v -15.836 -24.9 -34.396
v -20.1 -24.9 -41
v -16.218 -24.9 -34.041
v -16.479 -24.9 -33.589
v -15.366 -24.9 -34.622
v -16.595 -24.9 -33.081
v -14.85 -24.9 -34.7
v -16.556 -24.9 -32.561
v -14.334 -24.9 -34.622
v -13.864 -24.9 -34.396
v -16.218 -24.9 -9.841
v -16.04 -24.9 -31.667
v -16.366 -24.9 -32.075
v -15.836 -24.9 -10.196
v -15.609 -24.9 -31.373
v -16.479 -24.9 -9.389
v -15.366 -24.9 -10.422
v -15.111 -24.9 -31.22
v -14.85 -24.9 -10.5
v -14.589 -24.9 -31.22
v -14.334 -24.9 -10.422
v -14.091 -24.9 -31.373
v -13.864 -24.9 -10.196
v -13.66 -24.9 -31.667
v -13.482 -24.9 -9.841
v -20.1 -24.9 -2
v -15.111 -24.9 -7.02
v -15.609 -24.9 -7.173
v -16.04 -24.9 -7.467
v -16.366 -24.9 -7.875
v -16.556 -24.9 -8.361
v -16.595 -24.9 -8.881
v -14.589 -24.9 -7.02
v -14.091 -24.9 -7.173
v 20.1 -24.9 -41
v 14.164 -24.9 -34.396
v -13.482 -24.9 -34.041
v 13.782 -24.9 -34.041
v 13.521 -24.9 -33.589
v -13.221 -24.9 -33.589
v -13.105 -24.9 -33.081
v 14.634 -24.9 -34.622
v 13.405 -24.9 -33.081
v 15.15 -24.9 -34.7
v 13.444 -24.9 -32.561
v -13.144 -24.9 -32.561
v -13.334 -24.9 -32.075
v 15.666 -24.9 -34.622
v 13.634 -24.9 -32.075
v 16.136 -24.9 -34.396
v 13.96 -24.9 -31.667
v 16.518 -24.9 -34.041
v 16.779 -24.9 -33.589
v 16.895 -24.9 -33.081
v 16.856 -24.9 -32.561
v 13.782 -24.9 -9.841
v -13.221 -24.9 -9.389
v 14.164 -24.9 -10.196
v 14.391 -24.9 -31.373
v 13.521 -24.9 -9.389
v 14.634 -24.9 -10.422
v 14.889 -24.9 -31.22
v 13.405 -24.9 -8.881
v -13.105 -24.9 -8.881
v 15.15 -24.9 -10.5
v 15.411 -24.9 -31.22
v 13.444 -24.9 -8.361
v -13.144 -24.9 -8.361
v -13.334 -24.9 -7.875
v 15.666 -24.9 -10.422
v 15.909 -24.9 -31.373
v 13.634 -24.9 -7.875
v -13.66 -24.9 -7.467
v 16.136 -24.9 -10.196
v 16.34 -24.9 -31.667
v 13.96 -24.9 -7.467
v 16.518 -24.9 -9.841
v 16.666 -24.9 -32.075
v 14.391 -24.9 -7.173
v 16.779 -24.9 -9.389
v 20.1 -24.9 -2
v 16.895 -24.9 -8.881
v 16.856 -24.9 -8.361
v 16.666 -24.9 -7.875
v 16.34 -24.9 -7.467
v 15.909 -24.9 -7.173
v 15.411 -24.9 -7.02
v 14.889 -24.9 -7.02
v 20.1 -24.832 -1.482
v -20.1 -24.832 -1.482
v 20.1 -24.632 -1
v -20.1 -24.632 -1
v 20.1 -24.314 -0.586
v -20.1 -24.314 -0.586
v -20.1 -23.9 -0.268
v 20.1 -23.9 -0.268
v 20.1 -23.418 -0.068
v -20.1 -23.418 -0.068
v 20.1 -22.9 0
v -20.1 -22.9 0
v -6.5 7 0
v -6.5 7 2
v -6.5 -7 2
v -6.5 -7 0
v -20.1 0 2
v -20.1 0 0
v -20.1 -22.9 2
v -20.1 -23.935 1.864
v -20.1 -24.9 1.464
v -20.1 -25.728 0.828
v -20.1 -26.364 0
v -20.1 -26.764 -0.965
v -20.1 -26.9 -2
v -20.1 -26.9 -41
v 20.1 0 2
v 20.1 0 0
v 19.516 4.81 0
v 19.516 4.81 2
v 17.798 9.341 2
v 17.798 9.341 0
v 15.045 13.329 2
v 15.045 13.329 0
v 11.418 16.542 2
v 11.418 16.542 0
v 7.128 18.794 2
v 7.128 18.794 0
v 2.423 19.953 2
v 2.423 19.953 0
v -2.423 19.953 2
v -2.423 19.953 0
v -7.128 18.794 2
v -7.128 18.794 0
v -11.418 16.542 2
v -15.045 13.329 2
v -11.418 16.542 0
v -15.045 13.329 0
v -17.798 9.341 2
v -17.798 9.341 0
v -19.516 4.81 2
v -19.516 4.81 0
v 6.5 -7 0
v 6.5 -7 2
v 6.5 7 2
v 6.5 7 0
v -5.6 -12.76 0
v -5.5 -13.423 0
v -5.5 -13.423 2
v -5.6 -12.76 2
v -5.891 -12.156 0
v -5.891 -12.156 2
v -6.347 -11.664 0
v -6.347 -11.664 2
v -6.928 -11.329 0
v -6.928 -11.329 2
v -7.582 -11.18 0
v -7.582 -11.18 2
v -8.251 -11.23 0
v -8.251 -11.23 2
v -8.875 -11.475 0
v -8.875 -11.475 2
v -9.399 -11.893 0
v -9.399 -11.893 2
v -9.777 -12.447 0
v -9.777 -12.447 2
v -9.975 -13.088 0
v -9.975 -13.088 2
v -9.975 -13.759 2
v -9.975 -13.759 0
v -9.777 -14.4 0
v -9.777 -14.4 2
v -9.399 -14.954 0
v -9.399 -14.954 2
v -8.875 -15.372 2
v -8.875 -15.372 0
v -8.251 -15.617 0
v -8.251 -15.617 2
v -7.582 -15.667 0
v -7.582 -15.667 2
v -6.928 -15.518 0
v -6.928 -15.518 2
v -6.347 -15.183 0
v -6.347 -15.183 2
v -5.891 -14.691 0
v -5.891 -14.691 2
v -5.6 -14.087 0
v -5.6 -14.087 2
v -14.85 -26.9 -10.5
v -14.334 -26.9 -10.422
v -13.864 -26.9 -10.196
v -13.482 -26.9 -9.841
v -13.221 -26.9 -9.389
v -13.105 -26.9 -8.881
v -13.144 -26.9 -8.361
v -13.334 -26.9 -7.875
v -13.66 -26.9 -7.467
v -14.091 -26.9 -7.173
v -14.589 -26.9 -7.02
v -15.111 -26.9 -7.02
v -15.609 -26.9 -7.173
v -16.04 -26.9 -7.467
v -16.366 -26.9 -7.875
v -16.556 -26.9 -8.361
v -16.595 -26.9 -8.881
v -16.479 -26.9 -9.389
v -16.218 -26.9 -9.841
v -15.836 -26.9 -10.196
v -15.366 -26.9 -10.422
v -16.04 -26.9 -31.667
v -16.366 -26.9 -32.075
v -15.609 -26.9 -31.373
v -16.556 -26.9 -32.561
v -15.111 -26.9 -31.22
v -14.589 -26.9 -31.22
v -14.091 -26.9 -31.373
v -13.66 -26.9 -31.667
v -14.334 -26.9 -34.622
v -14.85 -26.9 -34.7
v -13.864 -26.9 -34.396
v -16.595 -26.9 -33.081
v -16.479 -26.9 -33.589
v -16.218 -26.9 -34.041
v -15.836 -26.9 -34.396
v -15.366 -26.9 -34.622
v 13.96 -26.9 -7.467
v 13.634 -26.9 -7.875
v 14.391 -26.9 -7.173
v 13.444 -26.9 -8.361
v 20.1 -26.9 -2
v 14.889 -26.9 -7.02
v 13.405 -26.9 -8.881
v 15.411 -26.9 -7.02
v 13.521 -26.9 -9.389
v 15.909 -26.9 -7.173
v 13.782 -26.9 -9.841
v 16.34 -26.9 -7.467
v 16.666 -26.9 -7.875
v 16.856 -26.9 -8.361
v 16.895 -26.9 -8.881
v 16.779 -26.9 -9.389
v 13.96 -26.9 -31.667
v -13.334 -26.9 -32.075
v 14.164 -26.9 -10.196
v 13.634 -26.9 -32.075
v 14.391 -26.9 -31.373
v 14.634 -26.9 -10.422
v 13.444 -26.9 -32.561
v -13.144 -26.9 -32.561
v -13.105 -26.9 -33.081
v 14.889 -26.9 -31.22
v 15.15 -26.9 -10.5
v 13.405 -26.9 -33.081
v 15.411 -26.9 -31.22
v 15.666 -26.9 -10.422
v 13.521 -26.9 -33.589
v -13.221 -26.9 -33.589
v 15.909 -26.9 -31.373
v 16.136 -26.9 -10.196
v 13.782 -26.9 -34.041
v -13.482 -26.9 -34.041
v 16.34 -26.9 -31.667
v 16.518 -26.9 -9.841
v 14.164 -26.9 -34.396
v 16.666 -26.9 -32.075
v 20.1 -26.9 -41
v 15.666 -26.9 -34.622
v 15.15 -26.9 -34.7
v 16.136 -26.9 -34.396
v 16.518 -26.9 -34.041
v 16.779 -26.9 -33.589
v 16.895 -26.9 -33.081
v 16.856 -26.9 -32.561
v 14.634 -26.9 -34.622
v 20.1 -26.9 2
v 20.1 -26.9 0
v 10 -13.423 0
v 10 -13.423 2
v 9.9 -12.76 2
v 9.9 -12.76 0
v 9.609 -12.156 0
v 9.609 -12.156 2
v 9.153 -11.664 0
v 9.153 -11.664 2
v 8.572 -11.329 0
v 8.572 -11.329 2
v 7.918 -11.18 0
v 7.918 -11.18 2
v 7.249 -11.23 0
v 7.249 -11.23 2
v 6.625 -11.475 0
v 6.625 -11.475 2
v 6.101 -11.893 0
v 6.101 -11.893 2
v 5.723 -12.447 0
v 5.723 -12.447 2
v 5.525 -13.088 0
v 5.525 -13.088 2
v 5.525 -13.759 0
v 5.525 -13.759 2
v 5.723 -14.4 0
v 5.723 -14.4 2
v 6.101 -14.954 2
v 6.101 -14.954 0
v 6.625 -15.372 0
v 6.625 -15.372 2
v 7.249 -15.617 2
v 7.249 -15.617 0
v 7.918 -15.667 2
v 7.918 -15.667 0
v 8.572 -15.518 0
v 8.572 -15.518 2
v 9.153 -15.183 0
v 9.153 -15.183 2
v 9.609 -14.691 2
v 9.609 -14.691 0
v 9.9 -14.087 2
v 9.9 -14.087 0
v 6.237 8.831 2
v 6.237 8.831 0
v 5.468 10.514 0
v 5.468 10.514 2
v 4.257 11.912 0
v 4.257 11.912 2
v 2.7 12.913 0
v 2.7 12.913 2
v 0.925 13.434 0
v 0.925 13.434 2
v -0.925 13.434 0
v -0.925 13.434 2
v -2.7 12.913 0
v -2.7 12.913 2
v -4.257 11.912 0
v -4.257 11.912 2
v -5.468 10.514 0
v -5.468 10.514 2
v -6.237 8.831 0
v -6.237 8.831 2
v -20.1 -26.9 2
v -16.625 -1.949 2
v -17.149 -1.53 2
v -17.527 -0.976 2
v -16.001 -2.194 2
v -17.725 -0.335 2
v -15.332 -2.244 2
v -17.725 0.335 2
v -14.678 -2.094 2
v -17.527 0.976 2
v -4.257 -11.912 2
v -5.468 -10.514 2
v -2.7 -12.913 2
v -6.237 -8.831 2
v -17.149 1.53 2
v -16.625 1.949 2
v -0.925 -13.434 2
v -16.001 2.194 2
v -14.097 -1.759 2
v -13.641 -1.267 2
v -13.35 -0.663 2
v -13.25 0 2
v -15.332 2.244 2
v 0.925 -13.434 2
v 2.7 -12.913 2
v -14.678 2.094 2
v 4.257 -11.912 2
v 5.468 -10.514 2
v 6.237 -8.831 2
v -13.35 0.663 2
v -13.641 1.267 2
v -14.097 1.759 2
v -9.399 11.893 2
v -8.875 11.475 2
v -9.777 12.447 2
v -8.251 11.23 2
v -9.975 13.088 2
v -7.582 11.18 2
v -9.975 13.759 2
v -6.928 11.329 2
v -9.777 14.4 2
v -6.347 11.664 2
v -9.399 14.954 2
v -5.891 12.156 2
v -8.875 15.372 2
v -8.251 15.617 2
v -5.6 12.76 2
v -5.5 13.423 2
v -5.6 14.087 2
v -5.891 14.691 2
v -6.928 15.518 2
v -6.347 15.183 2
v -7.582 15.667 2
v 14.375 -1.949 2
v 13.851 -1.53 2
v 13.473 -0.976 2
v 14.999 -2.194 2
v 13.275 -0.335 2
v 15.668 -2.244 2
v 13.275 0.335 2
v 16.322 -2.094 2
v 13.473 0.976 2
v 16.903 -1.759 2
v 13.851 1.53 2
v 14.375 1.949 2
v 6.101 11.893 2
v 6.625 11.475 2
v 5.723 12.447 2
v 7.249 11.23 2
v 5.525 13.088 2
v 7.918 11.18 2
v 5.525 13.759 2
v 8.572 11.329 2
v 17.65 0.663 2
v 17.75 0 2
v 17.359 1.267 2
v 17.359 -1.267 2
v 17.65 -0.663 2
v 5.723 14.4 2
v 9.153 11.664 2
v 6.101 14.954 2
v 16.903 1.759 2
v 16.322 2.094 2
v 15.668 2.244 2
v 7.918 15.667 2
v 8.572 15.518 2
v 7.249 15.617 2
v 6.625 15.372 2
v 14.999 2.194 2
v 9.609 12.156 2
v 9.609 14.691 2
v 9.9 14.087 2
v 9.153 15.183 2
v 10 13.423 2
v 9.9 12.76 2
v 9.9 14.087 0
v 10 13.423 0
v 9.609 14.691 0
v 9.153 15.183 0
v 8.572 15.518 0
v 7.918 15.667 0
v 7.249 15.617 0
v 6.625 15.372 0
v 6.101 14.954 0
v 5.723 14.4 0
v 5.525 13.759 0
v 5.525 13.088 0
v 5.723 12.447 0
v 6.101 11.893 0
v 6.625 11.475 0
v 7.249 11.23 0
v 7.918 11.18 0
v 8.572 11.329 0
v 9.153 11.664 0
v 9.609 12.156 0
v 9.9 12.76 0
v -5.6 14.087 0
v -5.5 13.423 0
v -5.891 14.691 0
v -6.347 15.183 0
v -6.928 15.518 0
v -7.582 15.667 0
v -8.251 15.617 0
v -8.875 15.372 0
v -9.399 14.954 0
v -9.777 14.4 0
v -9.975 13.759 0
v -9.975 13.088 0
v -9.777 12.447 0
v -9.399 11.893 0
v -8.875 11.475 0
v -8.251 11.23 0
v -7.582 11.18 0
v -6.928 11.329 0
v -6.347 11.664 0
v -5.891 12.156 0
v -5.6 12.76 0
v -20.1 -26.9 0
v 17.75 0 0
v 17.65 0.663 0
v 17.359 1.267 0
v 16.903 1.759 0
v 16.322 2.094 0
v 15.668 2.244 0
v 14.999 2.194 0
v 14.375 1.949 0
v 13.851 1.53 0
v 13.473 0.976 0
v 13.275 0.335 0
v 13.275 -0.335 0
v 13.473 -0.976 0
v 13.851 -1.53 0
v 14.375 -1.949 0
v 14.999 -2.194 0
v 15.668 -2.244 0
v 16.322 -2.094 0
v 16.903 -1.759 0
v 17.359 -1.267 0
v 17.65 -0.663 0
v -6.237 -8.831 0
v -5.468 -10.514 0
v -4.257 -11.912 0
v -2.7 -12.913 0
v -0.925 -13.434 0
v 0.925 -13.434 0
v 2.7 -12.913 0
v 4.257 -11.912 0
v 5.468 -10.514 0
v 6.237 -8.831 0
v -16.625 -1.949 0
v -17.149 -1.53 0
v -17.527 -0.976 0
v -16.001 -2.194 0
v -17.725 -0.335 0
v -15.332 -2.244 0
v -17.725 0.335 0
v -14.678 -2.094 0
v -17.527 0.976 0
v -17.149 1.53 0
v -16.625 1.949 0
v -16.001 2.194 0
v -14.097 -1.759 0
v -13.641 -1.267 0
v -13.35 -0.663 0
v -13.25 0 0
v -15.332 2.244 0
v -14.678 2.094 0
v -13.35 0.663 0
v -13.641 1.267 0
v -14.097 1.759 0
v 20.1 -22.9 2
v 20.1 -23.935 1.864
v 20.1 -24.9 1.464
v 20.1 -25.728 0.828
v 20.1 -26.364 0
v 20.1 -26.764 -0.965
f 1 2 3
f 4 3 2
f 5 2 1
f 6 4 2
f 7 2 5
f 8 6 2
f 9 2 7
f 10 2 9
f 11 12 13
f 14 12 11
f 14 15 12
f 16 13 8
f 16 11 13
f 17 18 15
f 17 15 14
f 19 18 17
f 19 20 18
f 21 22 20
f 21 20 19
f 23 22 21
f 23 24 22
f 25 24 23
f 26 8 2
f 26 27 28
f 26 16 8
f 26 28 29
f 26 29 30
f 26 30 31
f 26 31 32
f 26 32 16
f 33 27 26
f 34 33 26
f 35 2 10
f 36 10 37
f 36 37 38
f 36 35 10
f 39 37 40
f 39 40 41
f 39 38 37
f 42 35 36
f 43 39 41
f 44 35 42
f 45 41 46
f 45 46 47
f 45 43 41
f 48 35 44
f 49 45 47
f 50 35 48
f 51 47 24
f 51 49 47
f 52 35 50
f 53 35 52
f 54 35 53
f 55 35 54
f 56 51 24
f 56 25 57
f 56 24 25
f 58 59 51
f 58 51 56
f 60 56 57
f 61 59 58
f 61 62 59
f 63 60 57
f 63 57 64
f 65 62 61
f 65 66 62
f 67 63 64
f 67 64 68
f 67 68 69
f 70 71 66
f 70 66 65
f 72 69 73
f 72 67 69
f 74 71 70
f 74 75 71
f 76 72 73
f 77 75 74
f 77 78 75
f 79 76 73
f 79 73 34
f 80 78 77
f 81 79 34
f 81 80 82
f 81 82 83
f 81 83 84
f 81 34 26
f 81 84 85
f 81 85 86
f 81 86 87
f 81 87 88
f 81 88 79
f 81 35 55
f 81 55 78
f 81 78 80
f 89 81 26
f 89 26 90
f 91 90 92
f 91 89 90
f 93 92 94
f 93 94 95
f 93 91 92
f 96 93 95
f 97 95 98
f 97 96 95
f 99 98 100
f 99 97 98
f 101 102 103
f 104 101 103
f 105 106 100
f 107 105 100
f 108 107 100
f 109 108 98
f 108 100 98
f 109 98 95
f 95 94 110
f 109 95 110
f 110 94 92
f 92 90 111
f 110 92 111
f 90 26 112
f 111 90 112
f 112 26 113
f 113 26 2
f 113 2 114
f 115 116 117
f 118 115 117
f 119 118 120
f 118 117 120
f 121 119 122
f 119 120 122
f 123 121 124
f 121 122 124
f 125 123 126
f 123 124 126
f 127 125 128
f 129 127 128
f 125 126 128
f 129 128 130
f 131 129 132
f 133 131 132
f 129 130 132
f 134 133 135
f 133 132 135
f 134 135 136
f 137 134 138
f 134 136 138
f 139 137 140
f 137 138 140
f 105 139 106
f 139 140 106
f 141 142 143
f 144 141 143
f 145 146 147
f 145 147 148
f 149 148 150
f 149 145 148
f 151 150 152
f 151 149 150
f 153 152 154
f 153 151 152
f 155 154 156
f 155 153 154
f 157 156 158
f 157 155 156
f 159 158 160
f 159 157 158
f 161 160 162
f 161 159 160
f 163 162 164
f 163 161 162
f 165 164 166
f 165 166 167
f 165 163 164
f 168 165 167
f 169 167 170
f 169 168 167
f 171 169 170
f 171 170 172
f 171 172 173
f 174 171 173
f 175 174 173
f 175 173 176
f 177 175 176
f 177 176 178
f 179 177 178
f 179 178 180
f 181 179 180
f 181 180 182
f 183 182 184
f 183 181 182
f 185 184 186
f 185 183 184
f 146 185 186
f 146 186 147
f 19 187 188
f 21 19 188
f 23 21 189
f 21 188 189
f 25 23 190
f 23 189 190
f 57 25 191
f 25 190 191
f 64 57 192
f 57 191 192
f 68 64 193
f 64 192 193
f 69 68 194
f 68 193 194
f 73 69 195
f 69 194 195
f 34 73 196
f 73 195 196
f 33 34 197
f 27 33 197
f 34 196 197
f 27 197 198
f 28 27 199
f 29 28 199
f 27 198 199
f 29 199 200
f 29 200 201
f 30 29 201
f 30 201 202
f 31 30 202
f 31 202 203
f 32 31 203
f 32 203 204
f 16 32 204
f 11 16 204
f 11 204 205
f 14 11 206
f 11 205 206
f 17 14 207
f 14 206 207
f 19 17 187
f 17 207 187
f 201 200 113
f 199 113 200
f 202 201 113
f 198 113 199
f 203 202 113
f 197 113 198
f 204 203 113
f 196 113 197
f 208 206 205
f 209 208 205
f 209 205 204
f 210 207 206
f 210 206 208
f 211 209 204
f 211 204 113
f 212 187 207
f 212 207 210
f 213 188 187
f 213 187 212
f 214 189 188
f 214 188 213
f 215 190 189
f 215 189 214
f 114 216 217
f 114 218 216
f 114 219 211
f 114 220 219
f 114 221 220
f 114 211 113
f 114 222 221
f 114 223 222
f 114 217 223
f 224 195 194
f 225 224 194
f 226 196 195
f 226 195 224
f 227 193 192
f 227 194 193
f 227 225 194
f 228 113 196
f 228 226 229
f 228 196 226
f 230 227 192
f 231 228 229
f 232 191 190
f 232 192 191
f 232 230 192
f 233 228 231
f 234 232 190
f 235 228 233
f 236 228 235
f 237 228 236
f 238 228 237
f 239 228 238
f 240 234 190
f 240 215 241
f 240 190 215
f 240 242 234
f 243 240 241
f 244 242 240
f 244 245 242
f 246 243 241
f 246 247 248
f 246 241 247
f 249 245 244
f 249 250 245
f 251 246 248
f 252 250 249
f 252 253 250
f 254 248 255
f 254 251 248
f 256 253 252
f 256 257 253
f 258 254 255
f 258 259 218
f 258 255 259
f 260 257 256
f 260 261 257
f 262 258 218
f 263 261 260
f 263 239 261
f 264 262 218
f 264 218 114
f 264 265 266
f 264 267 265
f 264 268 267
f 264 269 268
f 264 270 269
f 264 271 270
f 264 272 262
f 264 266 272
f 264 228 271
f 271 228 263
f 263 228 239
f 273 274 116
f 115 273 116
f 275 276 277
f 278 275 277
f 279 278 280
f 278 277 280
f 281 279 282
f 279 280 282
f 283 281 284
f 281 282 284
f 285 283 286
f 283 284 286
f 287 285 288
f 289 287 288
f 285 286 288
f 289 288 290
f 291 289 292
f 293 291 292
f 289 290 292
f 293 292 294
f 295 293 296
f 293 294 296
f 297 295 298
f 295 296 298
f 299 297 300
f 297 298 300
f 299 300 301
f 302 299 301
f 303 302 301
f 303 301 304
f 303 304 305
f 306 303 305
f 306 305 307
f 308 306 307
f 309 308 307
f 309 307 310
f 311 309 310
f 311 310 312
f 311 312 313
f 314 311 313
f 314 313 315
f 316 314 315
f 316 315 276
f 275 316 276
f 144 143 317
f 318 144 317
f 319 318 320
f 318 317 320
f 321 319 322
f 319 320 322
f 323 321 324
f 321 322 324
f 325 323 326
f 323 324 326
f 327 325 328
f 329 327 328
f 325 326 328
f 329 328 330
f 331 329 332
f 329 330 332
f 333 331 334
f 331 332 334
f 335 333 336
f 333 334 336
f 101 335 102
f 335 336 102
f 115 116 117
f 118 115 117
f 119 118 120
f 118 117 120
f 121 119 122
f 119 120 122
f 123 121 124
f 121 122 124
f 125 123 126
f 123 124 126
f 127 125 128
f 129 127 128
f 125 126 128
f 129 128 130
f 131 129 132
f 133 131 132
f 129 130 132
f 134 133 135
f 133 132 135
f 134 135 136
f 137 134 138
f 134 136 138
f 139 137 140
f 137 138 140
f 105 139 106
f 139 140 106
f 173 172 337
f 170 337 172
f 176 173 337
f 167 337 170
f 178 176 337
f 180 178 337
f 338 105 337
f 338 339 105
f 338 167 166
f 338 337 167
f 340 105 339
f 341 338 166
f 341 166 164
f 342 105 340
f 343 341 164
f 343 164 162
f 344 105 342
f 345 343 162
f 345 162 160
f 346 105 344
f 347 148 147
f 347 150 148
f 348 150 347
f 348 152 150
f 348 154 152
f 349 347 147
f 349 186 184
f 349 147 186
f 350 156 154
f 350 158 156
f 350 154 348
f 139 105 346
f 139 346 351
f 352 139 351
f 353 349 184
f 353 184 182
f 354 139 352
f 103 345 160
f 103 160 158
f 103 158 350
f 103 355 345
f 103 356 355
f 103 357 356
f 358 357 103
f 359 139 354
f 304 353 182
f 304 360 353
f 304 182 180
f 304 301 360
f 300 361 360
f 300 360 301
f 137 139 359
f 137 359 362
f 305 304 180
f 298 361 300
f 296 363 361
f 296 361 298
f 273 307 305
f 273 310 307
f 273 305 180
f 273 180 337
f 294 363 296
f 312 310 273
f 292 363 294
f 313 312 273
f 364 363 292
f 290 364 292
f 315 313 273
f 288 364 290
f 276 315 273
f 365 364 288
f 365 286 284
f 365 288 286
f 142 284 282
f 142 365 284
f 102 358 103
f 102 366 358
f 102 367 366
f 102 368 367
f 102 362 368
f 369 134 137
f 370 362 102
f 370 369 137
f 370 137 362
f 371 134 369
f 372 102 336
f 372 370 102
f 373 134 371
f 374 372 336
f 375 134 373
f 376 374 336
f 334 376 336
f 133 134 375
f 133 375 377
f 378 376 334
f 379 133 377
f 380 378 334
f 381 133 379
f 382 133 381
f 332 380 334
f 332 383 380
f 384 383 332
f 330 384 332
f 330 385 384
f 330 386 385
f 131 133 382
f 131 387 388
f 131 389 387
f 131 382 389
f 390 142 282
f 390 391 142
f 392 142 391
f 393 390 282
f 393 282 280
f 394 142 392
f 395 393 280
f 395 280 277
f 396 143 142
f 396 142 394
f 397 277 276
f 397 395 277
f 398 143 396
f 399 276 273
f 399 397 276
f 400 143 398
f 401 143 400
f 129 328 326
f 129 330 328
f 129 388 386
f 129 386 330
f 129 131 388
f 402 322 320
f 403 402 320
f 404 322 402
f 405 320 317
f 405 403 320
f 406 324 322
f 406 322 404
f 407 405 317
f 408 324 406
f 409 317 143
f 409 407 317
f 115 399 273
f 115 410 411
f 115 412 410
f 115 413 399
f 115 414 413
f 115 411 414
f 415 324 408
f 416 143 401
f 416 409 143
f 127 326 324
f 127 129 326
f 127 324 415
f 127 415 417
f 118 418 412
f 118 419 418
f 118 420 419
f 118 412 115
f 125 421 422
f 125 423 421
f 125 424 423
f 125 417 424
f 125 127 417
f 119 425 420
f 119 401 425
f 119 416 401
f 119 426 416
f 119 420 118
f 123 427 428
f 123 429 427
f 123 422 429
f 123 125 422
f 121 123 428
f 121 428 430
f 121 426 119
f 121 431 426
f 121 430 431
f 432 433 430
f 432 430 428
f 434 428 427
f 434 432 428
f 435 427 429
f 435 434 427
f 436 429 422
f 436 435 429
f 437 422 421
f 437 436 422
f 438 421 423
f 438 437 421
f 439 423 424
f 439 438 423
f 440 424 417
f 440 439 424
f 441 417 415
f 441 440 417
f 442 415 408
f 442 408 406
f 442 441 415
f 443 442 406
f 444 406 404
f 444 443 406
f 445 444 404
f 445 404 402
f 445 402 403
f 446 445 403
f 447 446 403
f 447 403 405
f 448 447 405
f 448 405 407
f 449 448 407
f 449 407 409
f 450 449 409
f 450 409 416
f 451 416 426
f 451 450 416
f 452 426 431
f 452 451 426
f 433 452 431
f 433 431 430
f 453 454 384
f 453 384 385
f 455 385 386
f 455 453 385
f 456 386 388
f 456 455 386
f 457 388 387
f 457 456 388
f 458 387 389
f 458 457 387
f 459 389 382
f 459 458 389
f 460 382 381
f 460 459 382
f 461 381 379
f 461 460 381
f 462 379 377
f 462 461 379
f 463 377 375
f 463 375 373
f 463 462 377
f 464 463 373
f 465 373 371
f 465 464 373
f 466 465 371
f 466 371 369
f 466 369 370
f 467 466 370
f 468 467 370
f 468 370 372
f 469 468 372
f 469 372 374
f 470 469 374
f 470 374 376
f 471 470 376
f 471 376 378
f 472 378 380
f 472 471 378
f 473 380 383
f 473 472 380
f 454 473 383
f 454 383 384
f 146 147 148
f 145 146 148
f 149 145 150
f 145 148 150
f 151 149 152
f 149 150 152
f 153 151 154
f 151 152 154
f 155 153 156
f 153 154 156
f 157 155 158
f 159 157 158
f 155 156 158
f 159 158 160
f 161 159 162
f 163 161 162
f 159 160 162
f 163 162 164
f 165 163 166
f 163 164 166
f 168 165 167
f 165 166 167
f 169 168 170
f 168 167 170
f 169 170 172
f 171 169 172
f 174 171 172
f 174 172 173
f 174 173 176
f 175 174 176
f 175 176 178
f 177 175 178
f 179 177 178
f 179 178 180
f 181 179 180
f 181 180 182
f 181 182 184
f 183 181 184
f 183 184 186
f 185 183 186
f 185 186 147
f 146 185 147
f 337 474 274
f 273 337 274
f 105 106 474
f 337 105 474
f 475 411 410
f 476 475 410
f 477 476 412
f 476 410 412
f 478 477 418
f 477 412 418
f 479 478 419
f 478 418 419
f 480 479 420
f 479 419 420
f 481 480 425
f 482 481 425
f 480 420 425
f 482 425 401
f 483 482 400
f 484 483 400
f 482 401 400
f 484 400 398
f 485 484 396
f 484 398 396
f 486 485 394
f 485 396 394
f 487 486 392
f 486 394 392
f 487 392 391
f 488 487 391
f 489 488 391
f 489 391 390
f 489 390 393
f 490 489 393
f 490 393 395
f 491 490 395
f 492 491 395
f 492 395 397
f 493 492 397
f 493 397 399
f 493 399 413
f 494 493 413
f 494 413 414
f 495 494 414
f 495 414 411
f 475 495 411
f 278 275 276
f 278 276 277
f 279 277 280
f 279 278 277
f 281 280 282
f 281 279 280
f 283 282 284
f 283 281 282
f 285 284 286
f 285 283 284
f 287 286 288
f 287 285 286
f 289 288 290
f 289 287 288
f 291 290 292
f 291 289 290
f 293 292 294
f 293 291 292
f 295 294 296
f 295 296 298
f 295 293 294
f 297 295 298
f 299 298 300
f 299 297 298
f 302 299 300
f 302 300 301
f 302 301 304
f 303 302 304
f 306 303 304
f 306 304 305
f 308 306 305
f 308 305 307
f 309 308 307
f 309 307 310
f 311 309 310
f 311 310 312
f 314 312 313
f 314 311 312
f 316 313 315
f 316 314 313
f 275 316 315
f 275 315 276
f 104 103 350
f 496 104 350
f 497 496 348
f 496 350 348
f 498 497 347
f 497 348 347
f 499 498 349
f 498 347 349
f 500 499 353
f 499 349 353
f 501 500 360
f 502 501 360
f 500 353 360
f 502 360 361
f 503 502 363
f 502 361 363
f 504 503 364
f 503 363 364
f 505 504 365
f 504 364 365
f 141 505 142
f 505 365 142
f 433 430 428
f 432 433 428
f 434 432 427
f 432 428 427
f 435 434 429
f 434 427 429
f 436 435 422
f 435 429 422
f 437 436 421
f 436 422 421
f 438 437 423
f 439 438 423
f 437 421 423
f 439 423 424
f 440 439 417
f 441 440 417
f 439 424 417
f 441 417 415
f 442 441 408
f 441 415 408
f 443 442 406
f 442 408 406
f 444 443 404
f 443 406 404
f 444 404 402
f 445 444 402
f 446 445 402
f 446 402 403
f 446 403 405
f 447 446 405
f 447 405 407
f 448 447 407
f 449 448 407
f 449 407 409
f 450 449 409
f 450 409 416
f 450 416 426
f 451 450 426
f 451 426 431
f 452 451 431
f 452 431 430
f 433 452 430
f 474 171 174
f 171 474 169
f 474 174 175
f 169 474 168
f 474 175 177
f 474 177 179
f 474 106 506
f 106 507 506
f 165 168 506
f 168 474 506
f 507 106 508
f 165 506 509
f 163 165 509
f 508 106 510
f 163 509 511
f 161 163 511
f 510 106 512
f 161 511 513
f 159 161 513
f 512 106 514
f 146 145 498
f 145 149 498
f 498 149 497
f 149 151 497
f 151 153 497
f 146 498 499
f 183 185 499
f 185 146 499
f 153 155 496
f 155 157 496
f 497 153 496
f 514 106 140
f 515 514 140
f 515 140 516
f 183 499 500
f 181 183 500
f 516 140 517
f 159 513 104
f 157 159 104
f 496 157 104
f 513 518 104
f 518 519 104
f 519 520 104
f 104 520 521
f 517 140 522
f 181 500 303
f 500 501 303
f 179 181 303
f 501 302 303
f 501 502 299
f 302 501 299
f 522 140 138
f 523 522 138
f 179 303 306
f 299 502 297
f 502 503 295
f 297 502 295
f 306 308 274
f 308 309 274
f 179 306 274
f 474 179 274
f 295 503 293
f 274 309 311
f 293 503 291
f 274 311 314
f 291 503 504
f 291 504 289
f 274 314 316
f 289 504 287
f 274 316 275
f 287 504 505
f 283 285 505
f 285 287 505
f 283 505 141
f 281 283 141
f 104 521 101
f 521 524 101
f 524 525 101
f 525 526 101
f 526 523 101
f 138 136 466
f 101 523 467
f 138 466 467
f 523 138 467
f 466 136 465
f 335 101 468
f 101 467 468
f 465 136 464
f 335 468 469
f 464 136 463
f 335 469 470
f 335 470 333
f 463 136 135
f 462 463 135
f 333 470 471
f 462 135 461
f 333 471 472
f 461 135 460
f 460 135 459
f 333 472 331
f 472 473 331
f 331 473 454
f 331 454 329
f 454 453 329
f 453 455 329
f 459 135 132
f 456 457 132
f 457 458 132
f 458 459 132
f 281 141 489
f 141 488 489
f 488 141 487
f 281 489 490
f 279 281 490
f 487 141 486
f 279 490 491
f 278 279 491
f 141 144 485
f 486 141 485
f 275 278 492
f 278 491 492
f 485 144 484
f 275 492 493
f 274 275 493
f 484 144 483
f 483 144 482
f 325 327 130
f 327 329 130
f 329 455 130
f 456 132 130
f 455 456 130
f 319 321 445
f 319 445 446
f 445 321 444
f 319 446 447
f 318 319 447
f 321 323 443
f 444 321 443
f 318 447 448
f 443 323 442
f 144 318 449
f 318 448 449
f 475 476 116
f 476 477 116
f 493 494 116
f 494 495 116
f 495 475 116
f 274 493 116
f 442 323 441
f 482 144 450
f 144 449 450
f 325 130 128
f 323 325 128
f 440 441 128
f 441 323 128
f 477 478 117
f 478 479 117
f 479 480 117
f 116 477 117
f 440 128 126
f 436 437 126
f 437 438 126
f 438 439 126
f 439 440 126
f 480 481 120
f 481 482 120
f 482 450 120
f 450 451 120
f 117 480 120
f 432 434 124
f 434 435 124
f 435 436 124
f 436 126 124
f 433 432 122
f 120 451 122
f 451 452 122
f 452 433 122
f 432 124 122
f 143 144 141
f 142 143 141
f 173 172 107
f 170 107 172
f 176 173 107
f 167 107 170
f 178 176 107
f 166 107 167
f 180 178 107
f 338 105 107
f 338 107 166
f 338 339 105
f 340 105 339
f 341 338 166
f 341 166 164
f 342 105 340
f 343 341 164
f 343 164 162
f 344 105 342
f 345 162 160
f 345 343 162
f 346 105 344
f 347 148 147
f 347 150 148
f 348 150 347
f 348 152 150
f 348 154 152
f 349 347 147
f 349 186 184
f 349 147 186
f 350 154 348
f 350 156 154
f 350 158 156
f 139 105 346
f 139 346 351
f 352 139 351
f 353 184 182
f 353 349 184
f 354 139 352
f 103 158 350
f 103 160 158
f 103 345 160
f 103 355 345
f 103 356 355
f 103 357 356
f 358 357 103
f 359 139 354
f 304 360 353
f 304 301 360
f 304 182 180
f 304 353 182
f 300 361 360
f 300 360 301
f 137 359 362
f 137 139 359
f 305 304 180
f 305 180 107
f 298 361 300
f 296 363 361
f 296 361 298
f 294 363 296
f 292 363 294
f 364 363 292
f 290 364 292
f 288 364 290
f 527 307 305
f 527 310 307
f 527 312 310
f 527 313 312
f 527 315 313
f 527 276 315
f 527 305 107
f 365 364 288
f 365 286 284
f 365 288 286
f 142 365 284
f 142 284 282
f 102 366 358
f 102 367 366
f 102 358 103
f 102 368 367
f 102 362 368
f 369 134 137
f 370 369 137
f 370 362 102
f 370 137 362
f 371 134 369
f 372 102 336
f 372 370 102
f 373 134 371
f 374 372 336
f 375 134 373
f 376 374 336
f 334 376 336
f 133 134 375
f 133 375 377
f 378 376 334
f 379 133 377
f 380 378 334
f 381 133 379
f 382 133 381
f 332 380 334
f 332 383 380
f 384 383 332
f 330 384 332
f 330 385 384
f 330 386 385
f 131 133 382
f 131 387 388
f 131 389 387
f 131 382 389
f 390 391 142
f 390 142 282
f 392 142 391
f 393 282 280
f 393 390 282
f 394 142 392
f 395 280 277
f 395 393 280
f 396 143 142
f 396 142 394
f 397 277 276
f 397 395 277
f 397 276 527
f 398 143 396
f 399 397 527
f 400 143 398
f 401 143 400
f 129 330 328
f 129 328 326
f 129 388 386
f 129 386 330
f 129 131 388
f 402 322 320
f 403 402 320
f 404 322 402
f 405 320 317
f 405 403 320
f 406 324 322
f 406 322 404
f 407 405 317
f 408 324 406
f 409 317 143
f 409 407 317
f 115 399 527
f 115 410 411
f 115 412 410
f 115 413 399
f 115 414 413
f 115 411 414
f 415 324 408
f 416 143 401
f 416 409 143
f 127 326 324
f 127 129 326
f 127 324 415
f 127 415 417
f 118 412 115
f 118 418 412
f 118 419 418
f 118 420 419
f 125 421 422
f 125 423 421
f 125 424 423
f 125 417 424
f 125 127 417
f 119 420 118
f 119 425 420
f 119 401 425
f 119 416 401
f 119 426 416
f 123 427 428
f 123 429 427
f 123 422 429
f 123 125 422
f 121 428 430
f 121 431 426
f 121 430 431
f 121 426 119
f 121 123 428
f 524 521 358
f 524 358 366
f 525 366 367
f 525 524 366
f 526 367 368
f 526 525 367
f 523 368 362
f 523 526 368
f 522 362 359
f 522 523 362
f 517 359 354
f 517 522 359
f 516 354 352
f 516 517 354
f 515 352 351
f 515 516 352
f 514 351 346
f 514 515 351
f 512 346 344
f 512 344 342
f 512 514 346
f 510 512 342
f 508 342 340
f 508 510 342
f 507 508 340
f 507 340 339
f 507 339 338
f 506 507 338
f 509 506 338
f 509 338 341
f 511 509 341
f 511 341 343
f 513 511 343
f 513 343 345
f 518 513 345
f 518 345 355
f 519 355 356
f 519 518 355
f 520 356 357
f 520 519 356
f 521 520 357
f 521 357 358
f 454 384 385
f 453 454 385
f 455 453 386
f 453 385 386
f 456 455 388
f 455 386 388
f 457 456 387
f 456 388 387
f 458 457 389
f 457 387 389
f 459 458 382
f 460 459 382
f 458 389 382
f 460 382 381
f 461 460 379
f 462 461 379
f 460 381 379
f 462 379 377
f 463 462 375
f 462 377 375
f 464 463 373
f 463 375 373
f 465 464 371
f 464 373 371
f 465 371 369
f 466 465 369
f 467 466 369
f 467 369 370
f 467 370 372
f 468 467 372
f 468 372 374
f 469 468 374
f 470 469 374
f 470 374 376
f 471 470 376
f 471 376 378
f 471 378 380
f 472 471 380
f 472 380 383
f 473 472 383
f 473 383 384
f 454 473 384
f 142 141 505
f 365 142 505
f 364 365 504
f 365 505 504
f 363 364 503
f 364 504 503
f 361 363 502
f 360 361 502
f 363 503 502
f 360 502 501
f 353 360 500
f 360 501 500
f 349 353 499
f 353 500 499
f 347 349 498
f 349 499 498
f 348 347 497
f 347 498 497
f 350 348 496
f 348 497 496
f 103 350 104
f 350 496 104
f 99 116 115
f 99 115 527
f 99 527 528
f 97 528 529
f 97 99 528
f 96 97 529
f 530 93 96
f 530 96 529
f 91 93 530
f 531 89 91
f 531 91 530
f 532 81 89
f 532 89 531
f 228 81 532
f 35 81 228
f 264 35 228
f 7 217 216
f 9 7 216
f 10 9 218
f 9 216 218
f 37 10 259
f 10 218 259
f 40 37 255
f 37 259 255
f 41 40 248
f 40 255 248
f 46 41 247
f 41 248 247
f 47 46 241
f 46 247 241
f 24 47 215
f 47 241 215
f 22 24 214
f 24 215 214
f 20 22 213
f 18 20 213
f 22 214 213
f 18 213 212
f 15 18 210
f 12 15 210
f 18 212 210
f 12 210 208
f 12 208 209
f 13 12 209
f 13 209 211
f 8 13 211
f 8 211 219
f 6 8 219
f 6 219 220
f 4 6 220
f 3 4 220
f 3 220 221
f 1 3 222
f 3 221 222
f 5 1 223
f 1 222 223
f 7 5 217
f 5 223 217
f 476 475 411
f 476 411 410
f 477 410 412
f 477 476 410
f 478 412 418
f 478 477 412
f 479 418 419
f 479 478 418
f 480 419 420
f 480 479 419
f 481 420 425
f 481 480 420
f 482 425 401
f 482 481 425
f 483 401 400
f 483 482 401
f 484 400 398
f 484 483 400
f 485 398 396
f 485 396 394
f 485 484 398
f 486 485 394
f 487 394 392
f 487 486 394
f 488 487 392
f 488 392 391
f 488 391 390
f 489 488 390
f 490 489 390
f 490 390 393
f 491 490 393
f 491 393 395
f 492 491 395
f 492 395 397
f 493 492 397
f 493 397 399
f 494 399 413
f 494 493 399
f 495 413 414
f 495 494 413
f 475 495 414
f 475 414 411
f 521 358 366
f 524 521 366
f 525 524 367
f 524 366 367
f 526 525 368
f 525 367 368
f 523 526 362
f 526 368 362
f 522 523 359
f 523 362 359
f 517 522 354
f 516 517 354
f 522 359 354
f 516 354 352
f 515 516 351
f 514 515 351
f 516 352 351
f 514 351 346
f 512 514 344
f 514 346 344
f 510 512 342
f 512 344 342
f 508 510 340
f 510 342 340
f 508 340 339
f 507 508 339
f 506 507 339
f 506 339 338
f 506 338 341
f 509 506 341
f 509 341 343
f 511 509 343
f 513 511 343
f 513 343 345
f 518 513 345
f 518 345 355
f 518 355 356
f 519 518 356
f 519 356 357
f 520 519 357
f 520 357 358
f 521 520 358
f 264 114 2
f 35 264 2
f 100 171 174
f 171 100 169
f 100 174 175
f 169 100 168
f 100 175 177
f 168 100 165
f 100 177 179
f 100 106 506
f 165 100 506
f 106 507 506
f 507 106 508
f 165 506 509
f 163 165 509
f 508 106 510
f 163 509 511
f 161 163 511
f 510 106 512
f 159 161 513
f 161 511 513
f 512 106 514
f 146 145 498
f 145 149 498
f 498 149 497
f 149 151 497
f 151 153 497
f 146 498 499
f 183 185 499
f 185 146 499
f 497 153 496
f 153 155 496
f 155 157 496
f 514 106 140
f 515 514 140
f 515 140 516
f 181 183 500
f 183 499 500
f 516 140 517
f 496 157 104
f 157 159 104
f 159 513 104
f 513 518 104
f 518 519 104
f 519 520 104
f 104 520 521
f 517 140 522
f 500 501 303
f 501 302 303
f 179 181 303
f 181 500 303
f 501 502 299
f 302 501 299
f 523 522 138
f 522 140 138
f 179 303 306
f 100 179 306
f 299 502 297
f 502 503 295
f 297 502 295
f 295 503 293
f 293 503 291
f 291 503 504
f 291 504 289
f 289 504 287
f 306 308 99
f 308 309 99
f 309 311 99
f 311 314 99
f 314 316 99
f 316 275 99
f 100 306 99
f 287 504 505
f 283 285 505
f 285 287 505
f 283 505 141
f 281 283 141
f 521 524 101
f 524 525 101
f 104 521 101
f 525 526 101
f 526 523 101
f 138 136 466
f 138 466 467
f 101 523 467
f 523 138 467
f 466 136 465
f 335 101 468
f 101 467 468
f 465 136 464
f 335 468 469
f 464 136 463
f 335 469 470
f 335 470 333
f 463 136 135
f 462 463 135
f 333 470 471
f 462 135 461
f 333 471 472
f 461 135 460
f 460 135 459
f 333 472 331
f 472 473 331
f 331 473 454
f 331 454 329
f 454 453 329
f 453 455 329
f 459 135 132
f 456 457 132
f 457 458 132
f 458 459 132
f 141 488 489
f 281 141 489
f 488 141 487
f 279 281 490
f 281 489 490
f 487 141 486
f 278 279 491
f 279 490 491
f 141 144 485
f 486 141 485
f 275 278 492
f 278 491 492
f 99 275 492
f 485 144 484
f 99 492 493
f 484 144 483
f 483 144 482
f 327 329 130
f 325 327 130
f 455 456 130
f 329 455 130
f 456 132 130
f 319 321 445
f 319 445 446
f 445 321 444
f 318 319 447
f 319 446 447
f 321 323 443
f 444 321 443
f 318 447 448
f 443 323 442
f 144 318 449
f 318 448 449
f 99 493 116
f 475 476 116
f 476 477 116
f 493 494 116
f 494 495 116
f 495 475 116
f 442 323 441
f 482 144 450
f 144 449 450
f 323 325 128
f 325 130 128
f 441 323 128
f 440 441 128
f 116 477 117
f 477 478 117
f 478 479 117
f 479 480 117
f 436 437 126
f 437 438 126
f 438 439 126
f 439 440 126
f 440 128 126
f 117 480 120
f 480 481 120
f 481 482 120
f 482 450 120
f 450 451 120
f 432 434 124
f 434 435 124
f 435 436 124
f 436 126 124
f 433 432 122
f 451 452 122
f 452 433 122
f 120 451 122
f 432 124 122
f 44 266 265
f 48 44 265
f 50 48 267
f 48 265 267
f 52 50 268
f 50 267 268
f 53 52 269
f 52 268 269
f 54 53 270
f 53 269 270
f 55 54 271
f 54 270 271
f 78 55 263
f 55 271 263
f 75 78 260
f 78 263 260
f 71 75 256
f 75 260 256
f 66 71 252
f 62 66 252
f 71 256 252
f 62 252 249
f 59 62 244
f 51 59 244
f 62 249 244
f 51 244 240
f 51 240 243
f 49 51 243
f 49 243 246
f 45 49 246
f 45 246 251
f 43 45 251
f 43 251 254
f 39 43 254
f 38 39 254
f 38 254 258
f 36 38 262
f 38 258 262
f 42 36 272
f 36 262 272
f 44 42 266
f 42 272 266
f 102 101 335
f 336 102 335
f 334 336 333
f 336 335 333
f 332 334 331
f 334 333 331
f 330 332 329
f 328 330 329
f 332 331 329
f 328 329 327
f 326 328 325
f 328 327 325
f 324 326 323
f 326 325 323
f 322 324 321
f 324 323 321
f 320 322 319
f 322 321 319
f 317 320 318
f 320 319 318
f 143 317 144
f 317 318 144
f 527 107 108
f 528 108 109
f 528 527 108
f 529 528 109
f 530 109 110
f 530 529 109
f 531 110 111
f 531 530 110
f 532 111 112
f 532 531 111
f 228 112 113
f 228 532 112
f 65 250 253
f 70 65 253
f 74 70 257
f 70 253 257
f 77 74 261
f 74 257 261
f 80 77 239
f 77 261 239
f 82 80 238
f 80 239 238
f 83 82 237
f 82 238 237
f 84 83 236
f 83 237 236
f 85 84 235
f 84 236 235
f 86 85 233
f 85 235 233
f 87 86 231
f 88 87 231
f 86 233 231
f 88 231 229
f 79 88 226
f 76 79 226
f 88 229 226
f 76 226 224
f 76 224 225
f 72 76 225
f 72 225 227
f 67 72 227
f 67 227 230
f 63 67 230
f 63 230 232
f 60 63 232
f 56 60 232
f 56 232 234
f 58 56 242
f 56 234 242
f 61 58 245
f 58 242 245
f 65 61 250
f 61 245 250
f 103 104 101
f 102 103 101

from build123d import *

# Parameters (mm, degrees)
EXTRUDE_1_DEPTH                  = 2
CUT_EXTRUDE_1_REACH              = 35.64
SKETCH_2_R                       = 2.25
CUT_EXTRUDE_2_REACH              = 35.64
SHEET_METAL_2_OUTLINE_R          = 2.25
SHEET_METAL_2_DEPTH              = 2
SM_EDGE_FLANGE_1_STRIP_W         = 12
SM_EDGE_FLANGE_1_STRIP_H         = 2
SM_EDGE_FLANGE_1_STRIP_CUT_DEPTH = 40.2
SM_EDGE_FLANGE_1_DEPTH           = 40.2
SKETCH_12_R                      = 1.75
CUT_EXTRUDE_3_DEPTH              = 2


# Read off the part's stored shape, not the designer's step: 转换实体2
# Sheet-metal steps are written as plain solids
with BuildPart() as part:
    # 草图1 → 凸台-拉伸1 (new body)
    with BuildSketch(Plane.XY):
        with BuildLine():
            Line((-20.1, 0), (-20.1, -26.9))
            Line((-20.1, -26.9), (20.1, -26.9))
            Line((20.1, -26.9), (20.1, 0))
            ThreePointArc((20.1, 0), (0, 20.1), (-20.1, 0))
        make_face()
    extrude(amount=EXTRUDE_1_DEPTH)

    # Sketch 2 → 切除-拉伸1 (cut, up to next)
    with BuildSketch(Plane.XY.offset(2), mode=Mode.PRIVATE) as cut_extrude_1_sk1:
        with Locations((-15.5, 0)):
            Circle(SKETCH_2_R)
    cut_extrude_1_tool1 = extrude(cut_extrude_1_sk1.sketch, amount=-CUT_EXTRUDE_1_REACH, mode=Mode.PRIVATE) & part.part
    # Sketch 2 → 切除-拉伸1 (cut, up to next)
    with BuildSketch(Plane.XY.offset(2), mode=Mode.PRIVATE) as cut_extrude_1_sk2:
        with Locations((-7.75, 13.423393759)):
            Circle(SKETCH_2_R)
    cut_extrude_1_tool2 = extrude(cut_extrude_1_sk2.sketch, amount=-CUT_EXTRUDE_1_REACH, mode=Mode.PRIVATE) & part.part
    # Sketch 2 → 切除-拉伸1 (cut, up to next)
    with BuildSketch(Plane.XY.offset(2), mode=Mode.PRIVATE) as cut_extrude_1_sk3:
        with Locations((7.75, 13.423393759)):
            Circle(SKETCH_2_R)
    cut_extrude_1_tool3 = extrude(cut_extrude_1_sk3.sketch, amount=-CUT_EXTRUDE_1_REACH, mode=Mode.PRIVATE) & part.part
    # Sketch 2 → 切除-拉伸1 (cut, up to next)
    with BuildSketch(Plane.XY.offset(2), mode=Mode.PRIVATE) as cut_extrude_1_sk4:
        with Locations((15.5, 0)):
            Circle(SKETCH_2_R)
    cut_extrude_1_tool4 = extrude(cut_extrude_1_sk4.sketch, amount=-CUT_EXTRUDE_1_REACH, mode=Mode.PRIVATE) & part.part
    # Sketch 2 → 切除-拉伸1 (cut, up to next)
    with BuildSketch(Plane.XY.offset(2), mode=Mode.PRIVATE) as cut_extrude_1_sk5:
        with Locations((7.75, -13.423393759)):
            Circle(SKETCH_2_R)
    cut_extrude_1_tool5 = extrude(cut_extrude_1_sk5.sketch, amount=-CUT_EXTRUDE_1_REACH, mode=Mode.PRIVATE) & part.part
    # Sketch 2 → 切除-拉伸1 (cut, up to next)
    with BuildSketch(Plane.XY.offset(2), mode=Mode.PRIVATE) as cut_extrude_1_sk6:
        with Locations((-7.75, -13.423393759)):
            Circle(SKETCH_2_R)
    cut_extrude_1_tool6 = extrude(cut_extrude_1_sk6.sketch, amount=-CUT_EXTRUDE_1_REACH, mode=Mode.PRIVATE) & part.part
    add(cut_extrude_1_tool1.solids().sort_by_distance((-15.5, 0, 2))[0], mode=Mode.SUBTRACT)
    add(cut_extrude_1_tool2.solids().sort_by_distance((-7.75, 13.423394, 2))[0], mode=Mode.SUBTRACT)
    add(cut_extrude_1_tool3.solids().sort_by_distance((7.75, 13.423394, 2))[0], mode=Mode.SUBTRACT)
    add(cut_extrude_1_tool4.solids().sort_by_distance((15.5, 0, 2))[0], mode=Mode.SUBTRACT)
    add(cut_extrude_1_tool5.solids().sort_by_distance((7.75, -13.423394, 2))[0], mode=Mode.SUBTRACT)
    add(cut_extrude_1_tool6.solids().sort_by_distance((-7.75, -13.423394, 2))[0], mode=Mode.SUBTRACT)

    # 草图3 → 切除-拉伸2 (cut, up to next)
    with BuildSketch(Plane.XY.offset(2), mode=Mode.PRIVATE) as cut_extrude_2_sk1:
        with BuildLine():
            Line((-6.5, 7), (-6.5, -7))
            ThreePointArc((-6.5, -7), (0, -13.5), (6.5, -7))
            Line((6.5, -7), (6.5, 7))
            ThreePointArc((6.5, 7), (0, 13.5), (-6.5, 7))
        make_face()
    cut_extrude_2_tool1 = extrude(cut_extrude_2_sk1.sketch, amount=-CUT_EXTRUDE_2_REACH, mode=Mode.PRIVATE) & part.part
    add(cut_extrude_2_tool1.solids().sort_by_distance((0, 0, 2))[0], mode=Mode.SUBTRACT)


with BuildPart() as body_2:
    # Sheet Metal 2 outline → Sheet Metal 2 (new body)
    with BuildSketch(Plane.XY):
        with BuildLine():
            ThreePointArc((20.1, 0), (0, 20.1), (-20.1, 0))
            Line((-20.1, 0), (-20.1, -26.9))
            Line((-20.1, -26.9), (20.1, -26.9))
            Line((20.1, -26.9), (20.1, 0))
        make_face()
        with Locations((-7.75, -13.423393759)):
            Circle(SHEET_METAL_2_OUTLINE_R, mode=Mode.SUBTRACT)
        with Locations((7.75, -13.423393759)):
            Circle(SHEET_METAL_2_OUTLINE_R, mode=Mode.SUBTRACT)
        with Locations((-15.5, 0)):
            Circle(SHEET_METAL_2_OUTLINE_R, mode=Mode.SUBTRACT)
        with Locations((-7.75, 13.423393759)):
            Circle(SHEET_METAL_2_OUTLINE_R, mode=Mode.SUBTRACT)
        with BuildLine():
            ThreePointArc((-6.5, 7), (0, 13.5), (6.5, 7))
            Line((6.5, 7), (6.5, -7))
            ThreePointArc((6.5, -7), (0, -13.5), (-6.5, -7))
            Line((-6.5, -7), (-6.5, 7))
        make_face(mode=Mode.SUBTRACT)
        with Locations((15.5, 0)):
            Circle(SHEET_METAL_2_OUTLINE_R, mode=Mode.SUBTRACT)
        with Locations((7.75, 13.423393759)):
            Circle(SHEET_METAL_2_OUTLINE_R, mode=Mode.SUBTRACT)
    extrude(amount=SHEET_METAL_2_DEPTH)

    # 边线-法兰1 strip (across the edge) → 边线-法兰1 strip cut (cut)
    with BuildSketch(Plane(origin=(20.1, -26.9, 0), x_dir=(0, 1, 0), z_dir=(-1, 0, 0))):
        with Locations((-2, -1)):
            Rectangle(SM_EDGE_FLANGE_1_STRIP_W, SM_EDGE_FLANGE_1_STRIP_H)
    extrude(amount=SM_EDGE_FLANGE_1_STRIP_CUT_DEPTH, mode=Mode.SUBTRACT)

    # 边线-法兰1 section (across the edge) → 边线-法兰1 (add)
    with BuildSketch(Plane(origin=(20.1, -26.9, 0), x_dir=(0, 1, 0), z_dir=(-1, 0, 0))):
        with BuildLine():
            Line((0, 2), (0, 41))
            Line((0, 41), (2, 41))
            Line((2, 41), (2, 2))
            ThreePointArc((2, 2), (2.585786438, 0.585786438), (4, 0))
            Line((4, 0), (4, -2))
            ThreePointArc((4, -2), (1.171572875, -0.828427125), (0, 2))
        make_face()
    extrude(amount=SM_EDGE_FLANGE_1_DEPTH)

    # 草图12 → 切除-拉伸3 (cut)
    with BuildSketch(Plane(origin=(0, -26.9, 0), x_dir=(-1, 0, 0), z_dir=(0, -1, 0))):
        with Locations(Location((14.85, 32.95, 0), (0, 0, 90))):
            Circle(SKETCH_12_R)
        with Locations(Location((-15.15, 32.95, 0), (0, 0, 90))):
            Circle(SKETCH_12_R)
        with Locations(Location((-15.15, 8.75, 0), (0, 0, 90))):
            Circle(SKETCH_12_R)
        with Locations(Location((14.85, 8.75, 0), (0, 0, 90))):
            Circle(SKETCH_12_R)
    extrude(amount=-CUT_EXTRUDE_3_DEPTH, mode=Mode.SUBTRACT)


solid = Compound([part.part, body_2.part])
